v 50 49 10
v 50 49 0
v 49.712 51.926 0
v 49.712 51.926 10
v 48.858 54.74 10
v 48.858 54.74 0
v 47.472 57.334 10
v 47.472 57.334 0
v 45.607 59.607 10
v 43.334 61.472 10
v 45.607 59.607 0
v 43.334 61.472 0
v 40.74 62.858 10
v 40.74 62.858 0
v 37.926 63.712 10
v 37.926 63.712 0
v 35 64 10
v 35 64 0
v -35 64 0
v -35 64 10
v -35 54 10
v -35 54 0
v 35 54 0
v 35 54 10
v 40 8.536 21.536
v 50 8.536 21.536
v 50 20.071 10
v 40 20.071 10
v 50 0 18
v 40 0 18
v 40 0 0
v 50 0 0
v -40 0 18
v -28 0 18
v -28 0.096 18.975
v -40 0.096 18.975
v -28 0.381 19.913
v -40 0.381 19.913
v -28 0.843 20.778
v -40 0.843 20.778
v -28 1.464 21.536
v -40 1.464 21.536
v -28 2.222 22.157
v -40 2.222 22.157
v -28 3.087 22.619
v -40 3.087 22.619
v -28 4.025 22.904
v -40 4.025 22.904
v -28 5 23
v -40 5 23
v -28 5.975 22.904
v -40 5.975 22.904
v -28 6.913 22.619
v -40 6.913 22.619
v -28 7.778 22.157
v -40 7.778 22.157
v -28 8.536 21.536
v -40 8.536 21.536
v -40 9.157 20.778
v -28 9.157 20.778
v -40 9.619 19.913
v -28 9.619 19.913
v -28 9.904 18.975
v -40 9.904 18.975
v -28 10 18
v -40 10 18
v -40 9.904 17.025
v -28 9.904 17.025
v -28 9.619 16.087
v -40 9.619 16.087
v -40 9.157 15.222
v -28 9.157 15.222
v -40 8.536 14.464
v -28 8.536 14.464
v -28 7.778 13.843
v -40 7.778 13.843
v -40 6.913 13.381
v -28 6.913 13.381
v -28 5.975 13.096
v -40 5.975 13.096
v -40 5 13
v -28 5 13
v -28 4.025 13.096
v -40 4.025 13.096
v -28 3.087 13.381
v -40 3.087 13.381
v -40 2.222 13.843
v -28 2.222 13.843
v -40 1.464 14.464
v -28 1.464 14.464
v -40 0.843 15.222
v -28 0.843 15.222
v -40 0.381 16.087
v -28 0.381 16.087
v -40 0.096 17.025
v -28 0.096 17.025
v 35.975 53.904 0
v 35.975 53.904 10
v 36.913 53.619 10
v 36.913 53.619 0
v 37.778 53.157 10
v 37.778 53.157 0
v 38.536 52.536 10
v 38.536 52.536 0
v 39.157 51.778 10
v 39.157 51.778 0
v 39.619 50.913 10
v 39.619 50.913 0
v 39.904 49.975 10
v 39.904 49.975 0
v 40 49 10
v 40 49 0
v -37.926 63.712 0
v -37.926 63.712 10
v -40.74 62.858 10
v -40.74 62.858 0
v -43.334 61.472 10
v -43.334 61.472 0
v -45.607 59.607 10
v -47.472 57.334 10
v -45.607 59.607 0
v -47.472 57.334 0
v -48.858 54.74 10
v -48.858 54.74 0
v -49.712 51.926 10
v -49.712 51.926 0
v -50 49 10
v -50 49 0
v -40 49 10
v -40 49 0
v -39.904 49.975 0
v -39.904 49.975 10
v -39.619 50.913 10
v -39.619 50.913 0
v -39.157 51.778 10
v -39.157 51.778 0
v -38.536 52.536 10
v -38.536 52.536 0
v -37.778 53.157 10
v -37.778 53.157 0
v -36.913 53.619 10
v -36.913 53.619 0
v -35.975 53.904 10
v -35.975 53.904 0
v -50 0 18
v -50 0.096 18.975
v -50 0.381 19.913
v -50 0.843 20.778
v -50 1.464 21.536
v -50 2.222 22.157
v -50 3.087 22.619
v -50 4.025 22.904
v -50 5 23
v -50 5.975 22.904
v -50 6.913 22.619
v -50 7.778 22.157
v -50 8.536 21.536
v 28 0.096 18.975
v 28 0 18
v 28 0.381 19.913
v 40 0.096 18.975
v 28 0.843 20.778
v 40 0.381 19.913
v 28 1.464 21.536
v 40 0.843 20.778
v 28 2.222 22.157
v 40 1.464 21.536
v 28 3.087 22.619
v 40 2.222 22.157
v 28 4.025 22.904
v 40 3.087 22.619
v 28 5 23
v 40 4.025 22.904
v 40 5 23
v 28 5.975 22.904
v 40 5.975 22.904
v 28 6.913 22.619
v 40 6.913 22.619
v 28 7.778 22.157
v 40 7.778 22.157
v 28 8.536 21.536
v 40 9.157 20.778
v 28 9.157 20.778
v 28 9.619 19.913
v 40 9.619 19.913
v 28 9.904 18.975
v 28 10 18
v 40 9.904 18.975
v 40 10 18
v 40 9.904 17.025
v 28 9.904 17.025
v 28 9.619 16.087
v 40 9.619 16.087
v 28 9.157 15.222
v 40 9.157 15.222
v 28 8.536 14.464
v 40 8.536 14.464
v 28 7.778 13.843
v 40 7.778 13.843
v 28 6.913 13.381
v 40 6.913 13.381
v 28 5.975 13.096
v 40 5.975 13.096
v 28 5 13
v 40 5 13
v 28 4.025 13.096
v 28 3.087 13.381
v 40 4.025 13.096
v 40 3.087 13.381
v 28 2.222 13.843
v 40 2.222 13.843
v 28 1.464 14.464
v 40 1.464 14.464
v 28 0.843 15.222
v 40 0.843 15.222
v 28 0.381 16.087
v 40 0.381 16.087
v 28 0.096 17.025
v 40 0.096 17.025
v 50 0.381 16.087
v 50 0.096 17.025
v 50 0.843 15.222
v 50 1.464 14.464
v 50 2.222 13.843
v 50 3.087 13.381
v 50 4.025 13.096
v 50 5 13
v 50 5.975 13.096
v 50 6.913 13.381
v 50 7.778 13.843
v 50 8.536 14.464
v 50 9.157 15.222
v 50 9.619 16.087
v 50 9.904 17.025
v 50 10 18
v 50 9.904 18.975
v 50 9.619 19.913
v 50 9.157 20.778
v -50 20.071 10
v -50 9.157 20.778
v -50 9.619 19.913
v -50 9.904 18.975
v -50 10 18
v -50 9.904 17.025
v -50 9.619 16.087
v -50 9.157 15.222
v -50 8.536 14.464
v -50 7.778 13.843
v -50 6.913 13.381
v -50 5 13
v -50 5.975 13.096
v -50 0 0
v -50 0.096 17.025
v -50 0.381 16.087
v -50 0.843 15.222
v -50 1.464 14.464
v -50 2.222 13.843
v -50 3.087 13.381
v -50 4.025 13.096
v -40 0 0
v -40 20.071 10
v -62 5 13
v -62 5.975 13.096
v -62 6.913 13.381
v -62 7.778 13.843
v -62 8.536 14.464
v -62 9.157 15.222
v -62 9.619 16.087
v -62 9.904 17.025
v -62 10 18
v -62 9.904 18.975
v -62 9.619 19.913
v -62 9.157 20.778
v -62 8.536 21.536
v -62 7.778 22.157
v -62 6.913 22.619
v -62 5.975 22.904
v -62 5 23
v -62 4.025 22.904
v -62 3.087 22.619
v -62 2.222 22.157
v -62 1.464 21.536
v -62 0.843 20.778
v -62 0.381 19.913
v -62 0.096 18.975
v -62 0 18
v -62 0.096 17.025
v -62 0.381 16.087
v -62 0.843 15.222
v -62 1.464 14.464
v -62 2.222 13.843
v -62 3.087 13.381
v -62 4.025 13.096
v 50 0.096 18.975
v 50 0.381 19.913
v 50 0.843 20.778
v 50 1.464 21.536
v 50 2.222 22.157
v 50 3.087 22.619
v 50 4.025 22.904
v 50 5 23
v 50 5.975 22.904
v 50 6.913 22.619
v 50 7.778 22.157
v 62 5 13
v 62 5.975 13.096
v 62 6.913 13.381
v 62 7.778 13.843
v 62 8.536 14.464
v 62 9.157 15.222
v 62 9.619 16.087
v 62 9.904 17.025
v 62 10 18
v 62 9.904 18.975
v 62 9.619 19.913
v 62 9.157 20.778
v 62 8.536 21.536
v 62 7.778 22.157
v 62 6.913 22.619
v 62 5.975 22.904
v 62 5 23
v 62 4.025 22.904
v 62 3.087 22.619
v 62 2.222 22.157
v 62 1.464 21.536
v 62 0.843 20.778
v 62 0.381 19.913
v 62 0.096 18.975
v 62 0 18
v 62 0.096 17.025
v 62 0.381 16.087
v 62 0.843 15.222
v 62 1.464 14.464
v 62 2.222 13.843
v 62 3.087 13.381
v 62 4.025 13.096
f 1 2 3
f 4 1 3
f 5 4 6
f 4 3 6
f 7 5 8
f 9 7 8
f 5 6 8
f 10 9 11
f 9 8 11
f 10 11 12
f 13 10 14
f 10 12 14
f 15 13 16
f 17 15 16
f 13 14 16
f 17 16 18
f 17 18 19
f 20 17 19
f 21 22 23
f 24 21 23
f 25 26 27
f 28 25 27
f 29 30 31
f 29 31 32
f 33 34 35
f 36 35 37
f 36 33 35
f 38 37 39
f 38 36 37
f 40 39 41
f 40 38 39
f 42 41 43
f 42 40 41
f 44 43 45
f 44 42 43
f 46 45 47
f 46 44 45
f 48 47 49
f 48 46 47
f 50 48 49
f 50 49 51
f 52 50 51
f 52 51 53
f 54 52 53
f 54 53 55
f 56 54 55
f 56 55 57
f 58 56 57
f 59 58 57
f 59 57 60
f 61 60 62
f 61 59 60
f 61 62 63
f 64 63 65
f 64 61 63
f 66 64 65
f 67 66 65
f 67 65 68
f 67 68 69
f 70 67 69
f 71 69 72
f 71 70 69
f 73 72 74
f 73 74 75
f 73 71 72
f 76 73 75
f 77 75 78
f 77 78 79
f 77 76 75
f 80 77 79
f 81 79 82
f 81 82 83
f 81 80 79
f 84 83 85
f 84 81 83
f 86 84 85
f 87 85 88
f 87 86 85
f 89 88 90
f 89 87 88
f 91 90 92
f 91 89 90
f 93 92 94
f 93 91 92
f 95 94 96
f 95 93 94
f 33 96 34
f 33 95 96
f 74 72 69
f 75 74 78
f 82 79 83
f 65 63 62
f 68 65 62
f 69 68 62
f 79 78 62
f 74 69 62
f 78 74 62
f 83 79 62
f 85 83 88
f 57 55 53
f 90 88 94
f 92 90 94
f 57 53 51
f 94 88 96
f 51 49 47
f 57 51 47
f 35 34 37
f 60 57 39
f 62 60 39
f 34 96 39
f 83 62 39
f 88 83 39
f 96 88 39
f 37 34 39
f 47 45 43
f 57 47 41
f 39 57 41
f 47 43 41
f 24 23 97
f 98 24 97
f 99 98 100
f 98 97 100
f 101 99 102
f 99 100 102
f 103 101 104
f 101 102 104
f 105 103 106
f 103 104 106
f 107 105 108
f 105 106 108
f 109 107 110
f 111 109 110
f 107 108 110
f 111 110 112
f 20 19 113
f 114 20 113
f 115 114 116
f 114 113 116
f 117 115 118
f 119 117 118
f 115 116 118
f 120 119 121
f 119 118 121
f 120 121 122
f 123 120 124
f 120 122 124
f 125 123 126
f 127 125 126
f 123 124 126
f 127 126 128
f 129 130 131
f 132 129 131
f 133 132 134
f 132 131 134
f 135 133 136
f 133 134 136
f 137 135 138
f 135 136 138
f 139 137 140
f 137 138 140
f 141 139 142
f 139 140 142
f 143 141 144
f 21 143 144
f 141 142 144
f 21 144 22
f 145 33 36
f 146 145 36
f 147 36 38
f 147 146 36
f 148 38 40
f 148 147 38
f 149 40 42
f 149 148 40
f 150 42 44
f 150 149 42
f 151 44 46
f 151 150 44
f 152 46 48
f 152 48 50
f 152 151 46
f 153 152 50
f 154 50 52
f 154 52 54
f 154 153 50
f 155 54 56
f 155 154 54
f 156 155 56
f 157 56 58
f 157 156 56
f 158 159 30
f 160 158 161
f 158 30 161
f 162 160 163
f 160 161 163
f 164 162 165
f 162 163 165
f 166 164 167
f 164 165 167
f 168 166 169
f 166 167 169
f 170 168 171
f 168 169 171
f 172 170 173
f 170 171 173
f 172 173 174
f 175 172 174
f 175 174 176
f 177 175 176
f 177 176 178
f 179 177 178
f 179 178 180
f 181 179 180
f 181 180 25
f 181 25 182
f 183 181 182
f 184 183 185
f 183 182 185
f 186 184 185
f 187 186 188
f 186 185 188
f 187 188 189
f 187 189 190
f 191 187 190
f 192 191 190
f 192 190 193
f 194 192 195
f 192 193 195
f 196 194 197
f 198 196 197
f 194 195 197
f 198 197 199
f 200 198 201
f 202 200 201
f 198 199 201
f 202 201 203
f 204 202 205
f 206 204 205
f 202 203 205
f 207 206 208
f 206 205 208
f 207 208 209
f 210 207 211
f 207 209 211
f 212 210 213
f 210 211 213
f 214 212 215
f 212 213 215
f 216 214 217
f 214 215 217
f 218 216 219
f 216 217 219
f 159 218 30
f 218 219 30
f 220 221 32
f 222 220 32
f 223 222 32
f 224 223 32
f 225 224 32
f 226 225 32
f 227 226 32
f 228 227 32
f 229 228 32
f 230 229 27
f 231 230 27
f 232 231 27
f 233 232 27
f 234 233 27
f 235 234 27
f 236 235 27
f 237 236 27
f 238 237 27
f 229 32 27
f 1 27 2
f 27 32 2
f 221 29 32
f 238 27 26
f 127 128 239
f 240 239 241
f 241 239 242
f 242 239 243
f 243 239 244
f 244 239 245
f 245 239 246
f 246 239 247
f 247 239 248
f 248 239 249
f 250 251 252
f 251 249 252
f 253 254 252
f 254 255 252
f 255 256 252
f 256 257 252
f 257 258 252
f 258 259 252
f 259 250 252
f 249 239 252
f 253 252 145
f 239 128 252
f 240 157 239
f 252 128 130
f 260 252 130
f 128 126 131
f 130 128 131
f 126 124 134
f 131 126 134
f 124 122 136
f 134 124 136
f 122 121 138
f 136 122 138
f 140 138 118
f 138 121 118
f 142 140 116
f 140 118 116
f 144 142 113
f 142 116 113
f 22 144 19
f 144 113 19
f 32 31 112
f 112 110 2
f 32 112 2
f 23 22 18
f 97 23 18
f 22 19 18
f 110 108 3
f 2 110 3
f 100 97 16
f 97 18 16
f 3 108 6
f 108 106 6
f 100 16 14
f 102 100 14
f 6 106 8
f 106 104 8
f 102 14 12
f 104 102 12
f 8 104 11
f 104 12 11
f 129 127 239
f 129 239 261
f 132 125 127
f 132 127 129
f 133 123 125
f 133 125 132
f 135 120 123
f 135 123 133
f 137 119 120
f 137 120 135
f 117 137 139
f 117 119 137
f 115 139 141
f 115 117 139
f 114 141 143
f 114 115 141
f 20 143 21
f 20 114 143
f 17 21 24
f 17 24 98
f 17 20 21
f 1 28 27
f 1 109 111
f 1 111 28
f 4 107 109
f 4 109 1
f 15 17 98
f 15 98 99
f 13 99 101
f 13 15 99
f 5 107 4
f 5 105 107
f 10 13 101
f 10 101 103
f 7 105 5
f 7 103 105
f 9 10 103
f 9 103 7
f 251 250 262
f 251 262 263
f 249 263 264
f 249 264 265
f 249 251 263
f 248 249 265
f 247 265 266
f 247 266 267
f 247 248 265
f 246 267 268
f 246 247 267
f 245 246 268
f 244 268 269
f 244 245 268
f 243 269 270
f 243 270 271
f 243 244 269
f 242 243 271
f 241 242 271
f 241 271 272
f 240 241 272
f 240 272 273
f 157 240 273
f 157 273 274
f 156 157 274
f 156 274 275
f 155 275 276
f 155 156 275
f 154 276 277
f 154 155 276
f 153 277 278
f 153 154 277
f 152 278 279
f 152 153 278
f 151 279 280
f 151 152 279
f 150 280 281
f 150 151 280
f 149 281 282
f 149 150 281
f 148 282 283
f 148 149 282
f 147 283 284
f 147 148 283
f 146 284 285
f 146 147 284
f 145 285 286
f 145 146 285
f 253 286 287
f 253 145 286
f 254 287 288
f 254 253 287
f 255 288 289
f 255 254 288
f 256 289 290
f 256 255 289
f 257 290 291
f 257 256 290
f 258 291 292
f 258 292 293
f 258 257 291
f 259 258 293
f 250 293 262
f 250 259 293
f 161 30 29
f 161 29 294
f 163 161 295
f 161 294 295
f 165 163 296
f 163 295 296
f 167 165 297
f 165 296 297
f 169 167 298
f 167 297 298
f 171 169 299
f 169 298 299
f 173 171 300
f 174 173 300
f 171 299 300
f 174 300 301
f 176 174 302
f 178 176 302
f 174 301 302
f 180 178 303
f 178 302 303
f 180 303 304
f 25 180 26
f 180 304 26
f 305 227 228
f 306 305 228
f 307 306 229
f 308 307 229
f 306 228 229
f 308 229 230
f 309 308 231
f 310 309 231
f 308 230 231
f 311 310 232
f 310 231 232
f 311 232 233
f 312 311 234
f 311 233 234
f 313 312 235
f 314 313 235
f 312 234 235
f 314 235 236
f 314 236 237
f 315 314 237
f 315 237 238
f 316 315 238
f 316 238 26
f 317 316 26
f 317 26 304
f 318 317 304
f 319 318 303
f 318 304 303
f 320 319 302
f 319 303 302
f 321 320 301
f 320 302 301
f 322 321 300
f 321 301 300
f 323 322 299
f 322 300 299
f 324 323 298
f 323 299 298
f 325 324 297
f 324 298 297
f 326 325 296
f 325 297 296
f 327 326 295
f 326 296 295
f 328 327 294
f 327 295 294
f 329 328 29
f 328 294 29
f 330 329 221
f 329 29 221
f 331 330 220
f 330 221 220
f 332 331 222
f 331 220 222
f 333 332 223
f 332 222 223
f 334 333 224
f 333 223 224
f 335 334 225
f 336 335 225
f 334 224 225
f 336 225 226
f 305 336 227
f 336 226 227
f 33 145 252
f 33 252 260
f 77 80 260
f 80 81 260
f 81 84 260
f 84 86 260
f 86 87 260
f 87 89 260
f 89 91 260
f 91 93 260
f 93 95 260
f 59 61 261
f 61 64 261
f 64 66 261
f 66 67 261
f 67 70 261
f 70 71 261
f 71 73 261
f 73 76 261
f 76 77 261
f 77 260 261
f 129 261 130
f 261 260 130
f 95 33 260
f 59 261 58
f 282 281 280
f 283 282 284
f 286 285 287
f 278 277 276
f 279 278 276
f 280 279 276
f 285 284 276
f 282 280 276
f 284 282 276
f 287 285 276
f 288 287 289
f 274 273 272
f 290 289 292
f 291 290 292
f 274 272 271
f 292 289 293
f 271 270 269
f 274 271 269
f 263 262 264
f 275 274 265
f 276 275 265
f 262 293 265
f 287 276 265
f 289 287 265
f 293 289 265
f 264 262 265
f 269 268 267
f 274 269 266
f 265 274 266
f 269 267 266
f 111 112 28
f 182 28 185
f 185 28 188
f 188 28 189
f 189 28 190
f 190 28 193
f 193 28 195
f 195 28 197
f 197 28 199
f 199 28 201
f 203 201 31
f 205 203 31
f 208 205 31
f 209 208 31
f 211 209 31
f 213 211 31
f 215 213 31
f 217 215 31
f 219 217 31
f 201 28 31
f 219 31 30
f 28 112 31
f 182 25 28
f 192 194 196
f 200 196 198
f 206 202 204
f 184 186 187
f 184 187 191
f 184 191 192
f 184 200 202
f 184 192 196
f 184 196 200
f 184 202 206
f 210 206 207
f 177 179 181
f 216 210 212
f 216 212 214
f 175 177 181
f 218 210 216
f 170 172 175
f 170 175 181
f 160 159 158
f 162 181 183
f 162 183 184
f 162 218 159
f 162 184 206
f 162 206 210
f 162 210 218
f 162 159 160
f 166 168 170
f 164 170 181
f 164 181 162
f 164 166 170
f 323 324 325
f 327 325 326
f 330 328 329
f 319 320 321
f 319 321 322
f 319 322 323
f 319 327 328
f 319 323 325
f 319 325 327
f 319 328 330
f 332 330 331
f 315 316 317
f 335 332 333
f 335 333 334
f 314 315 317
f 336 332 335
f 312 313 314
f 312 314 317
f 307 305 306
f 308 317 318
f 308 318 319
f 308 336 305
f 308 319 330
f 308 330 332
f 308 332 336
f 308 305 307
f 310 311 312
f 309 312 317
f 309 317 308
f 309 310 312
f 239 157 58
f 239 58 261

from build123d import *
from build123d.topology import SkipClean

# Parameters (mm, degrees)
EXTRUDE_1_DEPTH   = 10
EXTRUDE_1_2_DEPTH = 10
SKETCH_4_R        = 5
EXTRUDE_3_DEPTH   = 12
SKETCH_7_R        = 5
EXTRUDE_4_DEPTH   = 12


with BuildPart() as part:
    # 草图1 → Extrude 1 (new body)
    with BuildSketch(Plane.XY):
        with BuildLine():
            Line((50, 0), (50, 49))
            ThreePointArc((50, 49), (45.606601718, 59.606601718), (35, 64))
            Line((35, 64), (-35, 64))
            ThreePointArc((-35, 64), (-45.606601718, 59.606601718), (-50, 49))
            Line((-50, 49), (-50, 0))
            Line((-50, 0), (-40, 0))
            Line((-40, 0), (-40, 49))
            ThreePointArc((-40, 49), (-38.535533906, 52.535533906), (-35, 54))
            Line((-35, 54), (35, 54))
            ThreePointArc((35, 54), (38.535533906, 52.535533906), (40, 49))
            Line((40, 49), (40, 0))
            Line((40, 0), (50, 0))
        make_face()
    extrude(amount=EXTRUDE_1_DEPTH)

    # 草图2 → Extrude 1 2 (add)
    with BuildSketch(Plane(origin=(50, 0, 0), x_dir=(0, 0, -1), z_dir=(1, 0, 0))):
        with BuildLine():
            Line((0, 17.071067812), (0, 0))
            Line((0, 0), (-18, 0))
            ThreePointArc((-18, 0), (-22.619397663, 3.086582838), (-21.535533906, 8.535533906))
            Line((-21.535533906, 8.535533906), (-10, 20.071067812))
            Line((-10, 20.071067812), (0, 20.071067812))
            Line((0, 20.071067812), (0, 17.071067812))
        make_face()
    extrude_1_2 = extrude(amount=-EXTRUDE_1_2_DEPTH)

    # 草图4 → 凸台-拉伸3 (add)
    with BuildSketch(Plane.ZY.offset(-40)):
        with Locations(Location((18, 5, 0), (0, 0, 270))):
            Circle(SKETCH_4_R)
    extrude_3 = extrude(amount=EXTRUDE_3_DEPTH)

    # 镜向3: Extrude 1 2, 凸台-拉伸3 across plane
    add(extrude_1_2.mirror(Plane(origin=(0, 0, 0), x_dir=(0, 0, 1), z_dir=(1, 0, 0))))
    add(extrude_3.mirror(Plane(origin=(0, 0, 0), x_dir=(0, 0, 1), z_dir=(1, 0, 0))))

    # 草图7 → 凸台-拉伸4 (add)
    with SkipClean():  # the faces are left unmerged after this step: merging them gives an invalid solid
        with BuildSketch(Plane(origin=(50, 0, 0), x_dir=(0, 0, -1), z_dir=(1, 0, 0))):
            with Locations((-18, 5)):
                Circle(SKETCH_7_R)
        extrude_4 = extrude(amount=EXTRUDE_4_DEPTH)

    # 镜向4: 凸台-拉伸4 across plane
    with SkipClean():  # the faces are left unmerged after this step: merging them gives an invalid solid
        add(extrude_4.mirror(Plane(origin=(0, 0, 0), x_dir=(0, 0, 1), z_dir=(1, 0, 0))))


solid = part.part
